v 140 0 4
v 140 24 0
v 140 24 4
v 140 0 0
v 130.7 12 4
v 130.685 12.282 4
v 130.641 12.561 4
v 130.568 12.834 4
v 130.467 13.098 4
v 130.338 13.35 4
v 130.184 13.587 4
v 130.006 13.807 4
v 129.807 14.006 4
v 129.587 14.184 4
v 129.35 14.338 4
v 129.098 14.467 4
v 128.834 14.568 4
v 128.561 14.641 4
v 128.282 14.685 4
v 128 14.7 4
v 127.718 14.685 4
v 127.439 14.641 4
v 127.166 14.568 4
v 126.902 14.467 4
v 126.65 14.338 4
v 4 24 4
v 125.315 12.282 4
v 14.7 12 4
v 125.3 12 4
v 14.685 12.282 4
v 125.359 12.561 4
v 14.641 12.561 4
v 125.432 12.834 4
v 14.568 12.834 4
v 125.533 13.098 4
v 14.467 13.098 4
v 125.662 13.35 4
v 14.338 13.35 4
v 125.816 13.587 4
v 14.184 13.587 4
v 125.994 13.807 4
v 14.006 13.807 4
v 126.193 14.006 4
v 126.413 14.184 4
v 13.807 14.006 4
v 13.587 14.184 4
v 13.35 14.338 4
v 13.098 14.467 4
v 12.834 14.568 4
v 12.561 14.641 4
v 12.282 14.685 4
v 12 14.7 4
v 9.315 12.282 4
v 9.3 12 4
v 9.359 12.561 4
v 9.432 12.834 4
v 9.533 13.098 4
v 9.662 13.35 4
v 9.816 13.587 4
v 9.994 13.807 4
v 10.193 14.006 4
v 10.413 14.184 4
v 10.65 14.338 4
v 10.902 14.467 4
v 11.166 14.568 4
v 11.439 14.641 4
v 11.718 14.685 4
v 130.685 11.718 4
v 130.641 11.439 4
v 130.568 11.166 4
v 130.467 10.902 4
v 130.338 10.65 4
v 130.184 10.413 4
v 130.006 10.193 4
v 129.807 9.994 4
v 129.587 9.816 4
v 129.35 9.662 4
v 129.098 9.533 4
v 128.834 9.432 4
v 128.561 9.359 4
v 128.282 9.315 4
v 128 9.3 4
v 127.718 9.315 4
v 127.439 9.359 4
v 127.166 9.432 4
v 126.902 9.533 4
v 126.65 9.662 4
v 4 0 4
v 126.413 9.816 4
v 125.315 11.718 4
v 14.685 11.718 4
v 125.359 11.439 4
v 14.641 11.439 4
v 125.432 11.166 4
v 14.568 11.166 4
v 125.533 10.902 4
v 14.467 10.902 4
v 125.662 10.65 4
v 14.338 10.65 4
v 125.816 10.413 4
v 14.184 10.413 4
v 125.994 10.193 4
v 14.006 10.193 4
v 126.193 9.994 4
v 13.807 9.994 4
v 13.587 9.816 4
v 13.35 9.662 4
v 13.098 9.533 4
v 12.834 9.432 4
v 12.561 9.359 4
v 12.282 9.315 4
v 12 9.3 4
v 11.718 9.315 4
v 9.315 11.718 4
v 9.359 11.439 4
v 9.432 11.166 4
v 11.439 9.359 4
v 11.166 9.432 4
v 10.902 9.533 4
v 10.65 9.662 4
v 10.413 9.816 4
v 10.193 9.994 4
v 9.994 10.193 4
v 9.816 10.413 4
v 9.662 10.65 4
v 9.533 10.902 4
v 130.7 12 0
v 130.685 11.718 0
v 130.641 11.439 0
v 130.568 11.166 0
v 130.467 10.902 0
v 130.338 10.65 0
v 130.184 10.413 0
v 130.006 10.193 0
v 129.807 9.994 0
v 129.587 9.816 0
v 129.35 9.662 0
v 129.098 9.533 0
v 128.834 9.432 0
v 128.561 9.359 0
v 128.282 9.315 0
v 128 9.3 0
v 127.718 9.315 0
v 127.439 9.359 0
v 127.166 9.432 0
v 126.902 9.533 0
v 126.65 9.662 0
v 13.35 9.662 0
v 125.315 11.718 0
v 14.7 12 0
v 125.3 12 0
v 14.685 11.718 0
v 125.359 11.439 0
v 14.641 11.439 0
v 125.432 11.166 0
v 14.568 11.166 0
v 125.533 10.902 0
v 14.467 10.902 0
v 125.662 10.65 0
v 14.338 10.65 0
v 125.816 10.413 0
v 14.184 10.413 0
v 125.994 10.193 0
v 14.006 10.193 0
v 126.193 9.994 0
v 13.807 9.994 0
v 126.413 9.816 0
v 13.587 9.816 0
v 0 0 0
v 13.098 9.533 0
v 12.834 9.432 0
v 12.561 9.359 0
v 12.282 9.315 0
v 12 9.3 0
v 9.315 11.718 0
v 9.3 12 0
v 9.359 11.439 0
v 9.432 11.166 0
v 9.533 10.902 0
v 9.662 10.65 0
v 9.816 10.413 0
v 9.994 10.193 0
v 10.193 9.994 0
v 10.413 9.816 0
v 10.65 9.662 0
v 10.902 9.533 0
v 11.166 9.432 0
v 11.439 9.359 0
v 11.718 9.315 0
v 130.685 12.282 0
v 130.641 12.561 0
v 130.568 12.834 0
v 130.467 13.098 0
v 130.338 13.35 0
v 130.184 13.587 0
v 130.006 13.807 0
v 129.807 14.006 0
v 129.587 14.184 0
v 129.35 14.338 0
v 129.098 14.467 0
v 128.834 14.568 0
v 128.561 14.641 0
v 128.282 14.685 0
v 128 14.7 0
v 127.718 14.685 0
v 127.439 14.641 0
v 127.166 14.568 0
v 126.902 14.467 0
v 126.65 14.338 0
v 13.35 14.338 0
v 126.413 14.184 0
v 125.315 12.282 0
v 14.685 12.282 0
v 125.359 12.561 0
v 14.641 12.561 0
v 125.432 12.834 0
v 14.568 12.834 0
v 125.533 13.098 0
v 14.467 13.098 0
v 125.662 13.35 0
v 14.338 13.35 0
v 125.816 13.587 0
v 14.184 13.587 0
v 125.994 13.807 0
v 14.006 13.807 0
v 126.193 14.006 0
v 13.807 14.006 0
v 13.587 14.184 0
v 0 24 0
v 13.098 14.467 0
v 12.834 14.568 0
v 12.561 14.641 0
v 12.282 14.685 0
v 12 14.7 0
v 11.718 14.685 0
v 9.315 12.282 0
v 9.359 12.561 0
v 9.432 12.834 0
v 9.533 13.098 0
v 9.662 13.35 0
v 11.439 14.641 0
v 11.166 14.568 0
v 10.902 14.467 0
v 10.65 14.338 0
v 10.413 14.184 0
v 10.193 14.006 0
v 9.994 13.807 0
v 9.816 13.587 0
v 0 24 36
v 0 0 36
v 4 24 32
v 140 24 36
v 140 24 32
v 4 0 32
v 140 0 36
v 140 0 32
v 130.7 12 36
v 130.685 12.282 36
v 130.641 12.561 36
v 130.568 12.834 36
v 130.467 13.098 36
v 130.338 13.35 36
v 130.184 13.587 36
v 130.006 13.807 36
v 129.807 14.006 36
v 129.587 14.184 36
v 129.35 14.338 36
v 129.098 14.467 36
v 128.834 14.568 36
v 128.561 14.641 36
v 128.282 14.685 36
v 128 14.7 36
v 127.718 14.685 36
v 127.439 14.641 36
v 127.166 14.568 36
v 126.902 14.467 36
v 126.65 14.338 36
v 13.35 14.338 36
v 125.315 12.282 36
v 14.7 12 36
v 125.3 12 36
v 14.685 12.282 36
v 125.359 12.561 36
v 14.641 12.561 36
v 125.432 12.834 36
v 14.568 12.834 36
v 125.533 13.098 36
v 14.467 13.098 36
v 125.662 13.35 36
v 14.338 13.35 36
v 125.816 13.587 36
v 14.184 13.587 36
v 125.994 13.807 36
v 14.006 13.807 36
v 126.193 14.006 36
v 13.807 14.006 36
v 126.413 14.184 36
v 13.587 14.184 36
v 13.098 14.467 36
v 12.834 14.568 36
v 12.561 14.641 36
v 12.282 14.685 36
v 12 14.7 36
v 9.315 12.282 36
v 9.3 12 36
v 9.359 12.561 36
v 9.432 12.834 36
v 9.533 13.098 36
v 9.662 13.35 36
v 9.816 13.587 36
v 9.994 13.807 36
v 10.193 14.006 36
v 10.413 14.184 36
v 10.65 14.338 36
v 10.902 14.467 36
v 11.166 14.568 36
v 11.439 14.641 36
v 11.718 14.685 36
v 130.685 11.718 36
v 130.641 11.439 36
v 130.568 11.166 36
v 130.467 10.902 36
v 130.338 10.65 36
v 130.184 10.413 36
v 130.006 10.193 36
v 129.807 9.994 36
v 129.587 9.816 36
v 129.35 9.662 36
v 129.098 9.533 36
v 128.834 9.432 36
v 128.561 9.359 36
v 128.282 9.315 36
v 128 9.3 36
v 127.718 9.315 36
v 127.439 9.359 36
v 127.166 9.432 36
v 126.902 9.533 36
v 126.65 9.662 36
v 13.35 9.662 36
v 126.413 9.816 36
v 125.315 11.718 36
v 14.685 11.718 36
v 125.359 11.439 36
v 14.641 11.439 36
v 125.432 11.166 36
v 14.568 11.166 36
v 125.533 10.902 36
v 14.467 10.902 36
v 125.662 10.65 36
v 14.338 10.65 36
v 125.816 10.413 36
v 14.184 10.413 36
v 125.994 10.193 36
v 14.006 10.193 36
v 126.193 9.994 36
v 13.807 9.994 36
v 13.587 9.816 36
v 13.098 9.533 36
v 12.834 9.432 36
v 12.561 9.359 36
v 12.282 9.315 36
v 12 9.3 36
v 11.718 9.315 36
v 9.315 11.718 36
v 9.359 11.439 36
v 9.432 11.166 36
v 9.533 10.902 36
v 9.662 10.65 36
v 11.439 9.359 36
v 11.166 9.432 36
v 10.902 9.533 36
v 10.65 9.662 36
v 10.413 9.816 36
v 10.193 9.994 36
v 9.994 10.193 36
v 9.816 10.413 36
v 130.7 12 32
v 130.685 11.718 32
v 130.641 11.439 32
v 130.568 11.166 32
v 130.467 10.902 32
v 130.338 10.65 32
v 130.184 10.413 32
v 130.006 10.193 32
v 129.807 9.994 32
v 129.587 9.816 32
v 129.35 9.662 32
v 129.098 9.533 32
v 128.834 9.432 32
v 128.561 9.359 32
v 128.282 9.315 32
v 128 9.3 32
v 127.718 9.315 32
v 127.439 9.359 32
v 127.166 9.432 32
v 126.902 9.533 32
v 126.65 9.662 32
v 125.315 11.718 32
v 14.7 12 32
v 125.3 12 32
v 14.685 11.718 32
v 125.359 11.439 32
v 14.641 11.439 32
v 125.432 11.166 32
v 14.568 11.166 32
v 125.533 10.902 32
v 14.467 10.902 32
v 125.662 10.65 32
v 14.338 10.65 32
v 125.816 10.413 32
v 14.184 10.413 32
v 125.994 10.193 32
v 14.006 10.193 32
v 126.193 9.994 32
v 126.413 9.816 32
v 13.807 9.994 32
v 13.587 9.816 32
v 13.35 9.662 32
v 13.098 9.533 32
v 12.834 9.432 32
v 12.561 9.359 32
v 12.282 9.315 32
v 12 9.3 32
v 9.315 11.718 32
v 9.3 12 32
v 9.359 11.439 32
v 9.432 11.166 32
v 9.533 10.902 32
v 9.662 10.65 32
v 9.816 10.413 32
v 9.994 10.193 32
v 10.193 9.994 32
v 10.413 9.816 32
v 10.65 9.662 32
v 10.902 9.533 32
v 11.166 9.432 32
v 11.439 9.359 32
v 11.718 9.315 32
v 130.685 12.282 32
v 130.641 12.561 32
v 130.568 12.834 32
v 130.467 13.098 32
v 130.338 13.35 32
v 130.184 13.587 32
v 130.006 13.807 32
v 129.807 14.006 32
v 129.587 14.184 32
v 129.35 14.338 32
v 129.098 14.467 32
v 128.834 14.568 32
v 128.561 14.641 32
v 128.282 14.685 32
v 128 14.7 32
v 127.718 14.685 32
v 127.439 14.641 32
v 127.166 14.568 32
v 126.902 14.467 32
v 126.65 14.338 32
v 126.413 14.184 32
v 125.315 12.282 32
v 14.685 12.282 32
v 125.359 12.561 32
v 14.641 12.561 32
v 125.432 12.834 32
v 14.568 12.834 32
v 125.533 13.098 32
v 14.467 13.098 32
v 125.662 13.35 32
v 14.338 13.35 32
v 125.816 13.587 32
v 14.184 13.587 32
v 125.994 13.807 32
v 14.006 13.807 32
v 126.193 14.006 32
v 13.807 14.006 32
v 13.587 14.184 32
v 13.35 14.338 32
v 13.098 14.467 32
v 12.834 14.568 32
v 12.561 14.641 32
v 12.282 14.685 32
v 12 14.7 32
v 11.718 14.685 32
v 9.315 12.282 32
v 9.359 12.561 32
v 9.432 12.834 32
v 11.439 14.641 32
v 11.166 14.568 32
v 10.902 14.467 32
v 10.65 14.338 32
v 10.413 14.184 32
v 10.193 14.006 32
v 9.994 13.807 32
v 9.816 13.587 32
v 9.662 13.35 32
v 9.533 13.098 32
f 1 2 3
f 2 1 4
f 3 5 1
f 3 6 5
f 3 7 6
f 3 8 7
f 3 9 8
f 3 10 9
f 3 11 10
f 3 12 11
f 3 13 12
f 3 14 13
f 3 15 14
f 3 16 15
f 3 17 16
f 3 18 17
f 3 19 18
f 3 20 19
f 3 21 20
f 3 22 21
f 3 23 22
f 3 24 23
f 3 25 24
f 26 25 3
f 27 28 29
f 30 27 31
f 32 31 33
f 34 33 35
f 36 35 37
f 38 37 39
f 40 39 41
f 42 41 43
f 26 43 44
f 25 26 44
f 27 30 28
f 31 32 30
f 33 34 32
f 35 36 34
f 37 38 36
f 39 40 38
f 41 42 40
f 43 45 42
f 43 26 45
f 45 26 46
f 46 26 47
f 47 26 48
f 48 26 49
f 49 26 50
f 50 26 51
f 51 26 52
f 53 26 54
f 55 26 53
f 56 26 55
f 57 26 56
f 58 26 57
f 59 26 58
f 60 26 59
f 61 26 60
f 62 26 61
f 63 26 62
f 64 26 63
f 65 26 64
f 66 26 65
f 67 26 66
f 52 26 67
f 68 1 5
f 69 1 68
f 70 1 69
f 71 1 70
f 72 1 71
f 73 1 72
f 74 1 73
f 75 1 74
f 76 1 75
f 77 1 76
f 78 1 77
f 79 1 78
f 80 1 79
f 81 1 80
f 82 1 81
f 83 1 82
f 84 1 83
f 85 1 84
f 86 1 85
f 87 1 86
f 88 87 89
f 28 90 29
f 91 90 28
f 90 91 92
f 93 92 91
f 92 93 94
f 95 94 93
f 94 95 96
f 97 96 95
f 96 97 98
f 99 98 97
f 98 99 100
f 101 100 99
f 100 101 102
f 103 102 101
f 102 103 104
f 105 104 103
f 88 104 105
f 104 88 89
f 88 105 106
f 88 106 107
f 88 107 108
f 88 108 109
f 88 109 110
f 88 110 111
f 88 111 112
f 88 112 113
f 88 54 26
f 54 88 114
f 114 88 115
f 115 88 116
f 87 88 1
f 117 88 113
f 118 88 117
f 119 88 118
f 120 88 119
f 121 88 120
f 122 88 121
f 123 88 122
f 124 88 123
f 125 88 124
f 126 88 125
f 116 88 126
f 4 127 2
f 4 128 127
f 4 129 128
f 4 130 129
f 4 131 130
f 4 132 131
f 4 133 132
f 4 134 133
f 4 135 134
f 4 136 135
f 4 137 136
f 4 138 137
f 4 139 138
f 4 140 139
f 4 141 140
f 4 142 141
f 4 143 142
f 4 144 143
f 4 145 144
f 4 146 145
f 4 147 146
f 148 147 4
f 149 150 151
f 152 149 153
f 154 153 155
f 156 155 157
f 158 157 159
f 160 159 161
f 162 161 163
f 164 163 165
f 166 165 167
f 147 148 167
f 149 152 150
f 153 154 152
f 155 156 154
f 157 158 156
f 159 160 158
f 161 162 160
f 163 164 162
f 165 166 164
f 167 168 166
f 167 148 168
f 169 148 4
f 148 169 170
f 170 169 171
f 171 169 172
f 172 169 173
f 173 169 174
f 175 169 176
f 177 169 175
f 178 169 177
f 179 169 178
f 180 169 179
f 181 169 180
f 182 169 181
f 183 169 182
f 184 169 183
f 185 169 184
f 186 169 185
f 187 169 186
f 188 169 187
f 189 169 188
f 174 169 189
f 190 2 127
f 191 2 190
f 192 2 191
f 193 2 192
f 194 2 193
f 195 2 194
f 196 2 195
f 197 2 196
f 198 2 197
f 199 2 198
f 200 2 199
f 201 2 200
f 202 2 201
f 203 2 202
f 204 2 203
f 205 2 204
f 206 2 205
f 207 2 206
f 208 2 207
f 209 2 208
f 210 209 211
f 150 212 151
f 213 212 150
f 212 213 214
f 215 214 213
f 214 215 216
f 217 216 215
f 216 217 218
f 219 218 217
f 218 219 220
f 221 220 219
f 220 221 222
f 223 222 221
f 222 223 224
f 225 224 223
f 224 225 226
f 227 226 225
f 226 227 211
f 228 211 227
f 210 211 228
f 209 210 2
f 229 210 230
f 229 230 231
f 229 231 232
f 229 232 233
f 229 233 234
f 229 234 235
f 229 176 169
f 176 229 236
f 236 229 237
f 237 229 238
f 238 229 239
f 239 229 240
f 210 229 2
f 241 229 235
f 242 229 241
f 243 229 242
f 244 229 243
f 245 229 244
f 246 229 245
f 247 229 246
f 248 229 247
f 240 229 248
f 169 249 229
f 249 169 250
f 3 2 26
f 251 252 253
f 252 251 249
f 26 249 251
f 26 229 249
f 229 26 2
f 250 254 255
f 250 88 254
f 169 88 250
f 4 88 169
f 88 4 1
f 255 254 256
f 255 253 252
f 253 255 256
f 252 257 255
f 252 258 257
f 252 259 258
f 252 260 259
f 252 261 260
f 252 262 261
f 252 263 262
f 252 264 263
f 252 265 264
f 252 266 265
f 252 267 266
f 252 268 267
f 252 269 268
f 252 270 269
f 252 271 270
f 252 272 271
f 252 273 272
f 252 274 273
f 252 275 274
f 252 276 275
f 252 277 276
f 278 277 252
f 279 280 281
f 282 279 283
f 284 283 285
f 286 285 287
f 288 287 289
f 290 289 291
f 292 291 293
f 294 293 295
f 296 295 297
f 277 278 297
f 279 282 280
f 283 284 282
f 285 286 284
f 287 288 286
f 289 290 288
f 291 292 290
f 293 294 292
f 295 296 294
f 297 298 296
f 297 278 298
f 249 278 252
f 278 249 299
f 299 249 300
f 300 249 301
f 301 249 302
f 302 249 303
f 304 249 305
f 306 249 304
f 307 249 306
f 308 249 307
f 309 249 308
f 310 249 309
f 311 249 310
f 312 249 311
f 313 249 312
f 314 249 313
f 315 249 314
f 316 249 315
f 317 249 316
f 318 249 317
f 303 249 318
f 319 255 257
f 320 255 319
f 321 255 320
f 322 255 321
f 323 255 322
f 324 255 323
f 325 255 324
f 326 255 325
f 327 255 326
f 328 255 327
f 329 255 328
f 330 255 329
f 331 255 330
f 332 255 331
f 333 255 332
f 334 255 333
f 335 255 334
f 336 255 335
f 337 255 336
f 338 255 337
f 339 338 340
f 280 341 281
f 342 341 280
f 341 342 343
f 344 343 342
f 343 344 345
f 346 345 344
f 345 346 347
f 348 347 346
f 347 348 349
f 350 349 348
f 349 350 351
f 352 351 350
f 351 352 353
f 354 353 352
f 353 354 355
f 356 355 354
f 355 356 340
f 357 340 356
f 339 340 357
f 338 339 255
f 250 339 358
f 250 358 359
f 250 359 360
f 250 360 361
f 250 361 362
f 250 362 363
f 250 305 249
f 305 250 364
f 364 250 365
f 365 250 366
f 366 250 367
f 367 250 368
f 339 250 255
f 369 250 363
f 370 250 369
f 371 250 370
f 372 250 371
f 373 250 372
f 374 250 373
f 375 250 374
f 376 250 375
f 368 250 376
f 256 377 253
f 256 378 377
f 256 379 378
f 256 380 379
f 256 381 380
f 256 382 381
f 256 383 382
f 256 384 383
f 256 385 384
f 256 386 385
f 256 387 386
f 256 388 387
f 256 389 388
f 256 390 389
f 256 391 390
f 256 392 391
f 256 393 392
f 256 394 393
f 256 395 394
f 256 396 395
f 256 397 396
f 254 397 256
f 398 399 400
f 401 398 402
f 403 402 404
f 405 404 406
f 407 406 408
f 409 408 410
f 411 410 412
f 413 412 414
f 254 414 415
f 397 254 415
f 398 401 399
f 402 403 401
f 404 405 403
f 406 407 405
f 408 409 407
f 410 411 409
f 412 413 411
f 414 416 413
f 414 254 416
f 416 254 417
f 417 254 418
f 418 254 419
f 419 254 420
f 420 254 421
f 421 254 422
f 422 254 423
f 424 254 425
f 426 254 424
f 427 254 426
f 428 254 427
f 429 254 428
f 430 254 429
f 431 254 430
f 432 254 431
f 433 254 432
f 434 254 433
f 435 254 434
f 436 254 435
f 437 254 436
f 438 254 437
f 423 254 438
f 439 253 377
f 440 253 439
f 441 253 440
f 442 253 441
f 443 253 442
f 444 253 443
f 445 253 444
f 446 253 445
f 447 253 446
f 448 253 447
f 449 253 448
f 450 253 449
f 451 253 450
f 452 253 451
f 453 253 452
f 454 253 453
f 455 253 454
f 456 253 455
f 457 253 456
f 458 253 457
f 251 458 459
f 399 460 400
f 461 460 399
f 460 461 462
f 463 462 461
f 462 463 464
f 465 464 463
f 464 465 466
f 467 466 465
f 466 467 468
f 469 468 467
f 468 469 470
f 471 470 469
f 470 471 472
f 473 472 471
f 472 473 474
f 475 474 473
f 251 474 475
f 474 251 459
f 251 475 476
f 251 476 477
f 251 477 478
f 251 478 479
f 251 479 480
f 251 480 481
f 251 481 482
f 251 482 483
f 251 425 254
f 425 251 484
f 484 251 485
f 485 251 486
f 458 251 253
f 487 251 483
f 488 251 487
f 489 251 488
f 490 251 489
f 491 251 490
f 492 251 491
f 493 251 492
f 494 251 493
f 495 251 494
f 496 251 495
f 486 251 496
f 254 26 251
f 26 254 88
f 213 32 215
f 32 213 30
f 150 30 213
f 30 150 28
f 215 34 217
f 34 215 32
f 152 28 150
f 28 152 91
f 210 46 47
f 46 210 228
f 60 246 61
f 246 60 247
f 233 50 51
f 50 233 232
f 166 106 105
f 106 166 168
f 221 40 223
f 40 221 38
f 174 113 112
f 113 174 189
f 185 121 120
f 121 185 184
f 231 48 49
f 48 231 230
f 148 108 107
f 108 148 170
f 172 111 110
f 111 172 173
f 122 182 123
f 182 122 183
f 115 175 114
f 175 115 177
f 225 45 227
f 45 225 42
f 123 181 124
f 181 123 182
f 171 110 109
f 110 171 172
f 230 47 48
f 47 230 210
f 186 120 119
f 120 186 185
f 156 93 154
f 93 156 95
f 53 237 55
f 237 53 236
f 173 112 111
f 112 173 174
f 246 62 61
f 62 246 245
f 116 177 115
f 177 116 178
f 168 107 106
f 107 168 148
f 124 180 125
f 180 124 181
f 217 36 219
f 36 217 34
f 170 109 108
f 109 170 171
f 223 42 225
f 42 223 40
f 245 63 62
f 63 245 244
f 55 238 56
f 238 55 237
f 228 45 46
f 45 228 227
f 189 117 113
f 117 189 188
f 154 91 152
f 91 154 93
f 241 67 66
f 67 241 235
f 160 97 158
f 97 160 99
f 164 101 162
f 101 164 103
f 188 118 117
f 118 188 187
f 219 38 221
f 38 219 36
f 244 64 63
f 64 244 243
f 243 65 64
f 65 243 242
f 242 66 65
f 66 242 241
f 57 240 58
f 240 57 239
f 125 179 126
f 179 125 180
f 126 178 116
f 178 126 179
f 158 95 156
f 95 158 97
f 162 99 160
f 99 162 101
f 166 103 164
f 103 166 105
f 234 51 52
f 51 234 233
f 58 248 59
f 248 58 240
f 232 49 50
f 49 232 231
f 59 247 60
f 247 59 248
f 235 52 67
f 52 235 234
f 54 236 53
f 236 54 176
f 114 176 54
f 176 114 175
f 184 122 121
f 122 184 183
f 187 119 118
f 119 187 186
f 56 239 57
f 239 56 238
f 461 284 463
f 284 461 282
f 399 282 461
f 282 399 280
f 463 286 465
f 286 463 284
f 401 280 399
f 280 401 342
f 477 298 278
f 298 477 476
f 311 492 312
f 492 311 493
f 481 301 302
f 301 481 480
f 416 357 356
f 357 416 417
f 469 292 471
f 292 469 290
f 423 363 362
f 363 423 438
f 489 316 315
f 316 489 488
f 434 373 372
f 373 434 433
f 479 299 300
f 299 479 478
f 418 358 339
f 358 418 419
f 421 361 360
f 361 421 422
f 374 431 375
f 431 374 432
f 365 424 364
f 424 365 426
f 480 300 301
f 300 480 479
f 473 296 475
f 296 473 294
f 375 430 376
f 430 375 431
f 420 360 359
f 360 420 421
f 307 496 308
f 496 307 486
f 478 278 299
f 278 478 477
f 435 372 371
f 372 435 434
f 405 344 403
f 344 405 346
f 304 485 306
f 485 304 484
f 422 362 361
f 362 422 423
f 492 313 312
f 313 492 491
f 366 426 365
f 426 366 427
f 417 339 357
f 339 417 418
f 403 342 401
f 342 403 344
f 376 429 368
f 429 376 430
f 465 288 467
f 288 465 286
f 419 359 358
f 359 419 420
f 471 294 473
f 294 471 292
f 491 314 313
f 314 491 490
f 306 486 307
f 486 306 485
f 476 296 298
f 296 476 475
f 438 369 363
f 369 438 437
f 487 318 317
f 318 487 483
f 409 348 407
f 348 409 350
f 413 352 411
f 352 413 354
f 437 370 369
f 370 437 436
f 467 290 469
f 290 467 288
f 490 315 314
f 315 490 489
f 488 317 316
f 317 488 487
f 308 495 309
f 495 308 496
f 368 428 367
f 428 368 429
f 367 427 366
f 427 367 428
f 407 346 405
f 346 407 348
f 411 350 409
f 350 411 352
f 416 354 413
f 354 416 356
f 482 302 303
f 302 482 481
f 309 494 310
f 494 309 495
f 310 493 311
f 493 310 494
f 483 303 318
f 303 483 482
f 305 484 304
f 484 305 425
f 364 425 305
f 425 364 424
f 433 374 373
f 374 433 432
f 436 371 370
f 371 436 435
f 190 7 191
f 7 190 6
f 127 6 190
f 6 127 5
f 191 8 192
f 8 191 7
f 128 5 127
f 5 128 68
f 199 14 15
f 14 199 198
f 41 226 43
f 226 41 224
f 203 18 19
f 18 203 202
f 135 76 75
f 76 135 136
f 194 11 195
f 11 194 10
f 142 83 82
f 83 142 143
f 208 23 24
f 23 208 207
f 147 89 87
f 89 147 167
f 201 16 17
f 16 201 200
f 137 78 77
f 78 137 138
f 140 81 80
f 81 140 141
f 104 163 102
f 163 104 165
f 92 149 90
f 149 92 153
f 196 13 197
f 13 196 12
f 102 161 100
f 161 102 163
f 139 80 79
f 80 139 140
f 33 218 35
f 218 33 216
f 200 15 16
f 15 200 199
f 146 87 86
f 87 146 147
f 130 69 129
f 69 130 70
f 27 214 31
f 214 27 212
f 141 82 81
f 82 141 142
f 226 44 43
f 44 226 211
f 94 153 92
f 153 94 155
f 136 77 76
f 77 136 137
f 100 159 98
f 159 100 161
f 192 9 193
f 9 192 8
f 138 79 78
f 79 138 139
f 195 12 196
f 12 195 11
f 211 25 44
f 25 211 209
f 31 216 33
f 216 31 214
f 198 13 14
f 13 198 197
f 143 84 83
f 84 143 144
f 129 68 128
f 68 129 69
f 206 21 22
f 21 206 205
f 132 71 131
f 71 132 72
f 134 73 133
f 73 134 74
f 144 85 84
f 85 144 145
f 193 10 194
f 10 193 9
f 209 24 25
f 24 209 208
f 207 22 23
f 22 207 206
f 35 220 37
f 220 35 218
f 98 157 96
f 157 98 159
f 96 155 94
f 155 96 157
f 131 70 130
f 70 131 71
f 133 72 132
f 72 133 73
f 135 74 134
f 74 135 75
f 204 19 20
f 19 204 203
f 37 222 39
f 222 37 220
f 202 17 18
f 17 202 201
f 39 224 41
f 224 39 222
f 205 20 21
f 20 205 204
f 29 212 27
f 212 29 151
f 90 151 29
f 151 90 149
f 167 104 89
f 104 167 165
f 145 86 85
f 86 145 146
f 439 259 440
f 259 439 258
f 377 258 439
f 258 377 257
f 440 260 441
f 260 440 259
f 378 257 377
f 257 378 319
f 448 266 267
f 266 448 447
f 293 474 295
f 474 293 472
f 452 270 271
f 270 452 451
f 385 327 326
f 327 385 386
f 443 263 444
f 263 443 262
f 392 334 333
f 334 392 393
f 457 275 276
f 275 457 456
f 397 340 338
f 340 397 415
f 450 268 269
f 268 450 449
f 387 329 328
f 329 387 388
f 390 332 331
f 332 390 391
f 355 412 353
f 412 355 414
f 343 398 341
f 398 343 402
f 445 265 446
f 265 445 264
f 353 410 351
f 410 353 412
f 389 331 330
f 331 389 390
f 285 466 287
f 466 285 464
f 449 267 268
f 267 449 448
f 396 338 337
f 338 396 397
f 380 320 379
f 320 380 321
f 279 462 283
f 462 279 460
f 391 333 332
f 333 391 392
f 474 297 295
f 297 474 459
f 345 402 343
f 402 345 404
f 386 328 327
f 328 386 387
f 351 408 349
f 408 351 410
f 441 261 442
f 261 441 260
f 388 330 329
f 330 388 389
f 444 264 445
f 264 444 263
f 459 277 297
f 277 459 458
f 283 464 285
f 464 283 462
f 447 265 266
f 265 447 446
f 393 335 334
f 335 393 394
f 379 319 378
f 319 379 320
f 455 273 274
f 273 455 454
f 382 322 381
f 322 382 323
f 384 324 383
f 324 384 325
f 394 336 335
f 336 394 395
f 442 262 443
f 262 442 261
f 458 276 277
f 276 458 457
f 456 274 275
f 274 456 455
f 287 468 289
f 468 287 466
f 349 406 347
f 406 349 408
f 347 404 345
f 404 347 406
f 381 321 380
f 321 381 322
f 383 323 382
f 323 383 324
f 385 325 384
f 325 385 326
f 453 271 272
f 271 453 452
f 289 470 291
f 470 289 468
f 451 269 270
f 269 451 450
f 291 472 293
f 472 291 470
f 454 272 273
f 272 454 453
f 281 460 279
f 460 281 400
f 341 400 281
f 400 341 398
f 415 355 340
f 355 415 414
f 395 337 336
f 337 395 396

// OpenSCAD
// Z-offset mounting bracket.
$fn = 60;
eps = 0.02;
length = 140;
height = 32;
width = 24;
thickness = 4;
difference() {
    union() {
        cube([length,width,thickness]);
        translate([0,0,height]) cube([length,width,thickness]);
        translate([0,0,thickness]) cube([thickness,width,height-thickness]);
    }
    for (x=[12,length-12]) {
        translate([x,width/2,-eps]) cylinder(d=5.4,h=thickness+2*eps);
        translate([x,width/2,height-eps]) cylinder(d=5.4,h=thickness+2*eps);
    }
}
